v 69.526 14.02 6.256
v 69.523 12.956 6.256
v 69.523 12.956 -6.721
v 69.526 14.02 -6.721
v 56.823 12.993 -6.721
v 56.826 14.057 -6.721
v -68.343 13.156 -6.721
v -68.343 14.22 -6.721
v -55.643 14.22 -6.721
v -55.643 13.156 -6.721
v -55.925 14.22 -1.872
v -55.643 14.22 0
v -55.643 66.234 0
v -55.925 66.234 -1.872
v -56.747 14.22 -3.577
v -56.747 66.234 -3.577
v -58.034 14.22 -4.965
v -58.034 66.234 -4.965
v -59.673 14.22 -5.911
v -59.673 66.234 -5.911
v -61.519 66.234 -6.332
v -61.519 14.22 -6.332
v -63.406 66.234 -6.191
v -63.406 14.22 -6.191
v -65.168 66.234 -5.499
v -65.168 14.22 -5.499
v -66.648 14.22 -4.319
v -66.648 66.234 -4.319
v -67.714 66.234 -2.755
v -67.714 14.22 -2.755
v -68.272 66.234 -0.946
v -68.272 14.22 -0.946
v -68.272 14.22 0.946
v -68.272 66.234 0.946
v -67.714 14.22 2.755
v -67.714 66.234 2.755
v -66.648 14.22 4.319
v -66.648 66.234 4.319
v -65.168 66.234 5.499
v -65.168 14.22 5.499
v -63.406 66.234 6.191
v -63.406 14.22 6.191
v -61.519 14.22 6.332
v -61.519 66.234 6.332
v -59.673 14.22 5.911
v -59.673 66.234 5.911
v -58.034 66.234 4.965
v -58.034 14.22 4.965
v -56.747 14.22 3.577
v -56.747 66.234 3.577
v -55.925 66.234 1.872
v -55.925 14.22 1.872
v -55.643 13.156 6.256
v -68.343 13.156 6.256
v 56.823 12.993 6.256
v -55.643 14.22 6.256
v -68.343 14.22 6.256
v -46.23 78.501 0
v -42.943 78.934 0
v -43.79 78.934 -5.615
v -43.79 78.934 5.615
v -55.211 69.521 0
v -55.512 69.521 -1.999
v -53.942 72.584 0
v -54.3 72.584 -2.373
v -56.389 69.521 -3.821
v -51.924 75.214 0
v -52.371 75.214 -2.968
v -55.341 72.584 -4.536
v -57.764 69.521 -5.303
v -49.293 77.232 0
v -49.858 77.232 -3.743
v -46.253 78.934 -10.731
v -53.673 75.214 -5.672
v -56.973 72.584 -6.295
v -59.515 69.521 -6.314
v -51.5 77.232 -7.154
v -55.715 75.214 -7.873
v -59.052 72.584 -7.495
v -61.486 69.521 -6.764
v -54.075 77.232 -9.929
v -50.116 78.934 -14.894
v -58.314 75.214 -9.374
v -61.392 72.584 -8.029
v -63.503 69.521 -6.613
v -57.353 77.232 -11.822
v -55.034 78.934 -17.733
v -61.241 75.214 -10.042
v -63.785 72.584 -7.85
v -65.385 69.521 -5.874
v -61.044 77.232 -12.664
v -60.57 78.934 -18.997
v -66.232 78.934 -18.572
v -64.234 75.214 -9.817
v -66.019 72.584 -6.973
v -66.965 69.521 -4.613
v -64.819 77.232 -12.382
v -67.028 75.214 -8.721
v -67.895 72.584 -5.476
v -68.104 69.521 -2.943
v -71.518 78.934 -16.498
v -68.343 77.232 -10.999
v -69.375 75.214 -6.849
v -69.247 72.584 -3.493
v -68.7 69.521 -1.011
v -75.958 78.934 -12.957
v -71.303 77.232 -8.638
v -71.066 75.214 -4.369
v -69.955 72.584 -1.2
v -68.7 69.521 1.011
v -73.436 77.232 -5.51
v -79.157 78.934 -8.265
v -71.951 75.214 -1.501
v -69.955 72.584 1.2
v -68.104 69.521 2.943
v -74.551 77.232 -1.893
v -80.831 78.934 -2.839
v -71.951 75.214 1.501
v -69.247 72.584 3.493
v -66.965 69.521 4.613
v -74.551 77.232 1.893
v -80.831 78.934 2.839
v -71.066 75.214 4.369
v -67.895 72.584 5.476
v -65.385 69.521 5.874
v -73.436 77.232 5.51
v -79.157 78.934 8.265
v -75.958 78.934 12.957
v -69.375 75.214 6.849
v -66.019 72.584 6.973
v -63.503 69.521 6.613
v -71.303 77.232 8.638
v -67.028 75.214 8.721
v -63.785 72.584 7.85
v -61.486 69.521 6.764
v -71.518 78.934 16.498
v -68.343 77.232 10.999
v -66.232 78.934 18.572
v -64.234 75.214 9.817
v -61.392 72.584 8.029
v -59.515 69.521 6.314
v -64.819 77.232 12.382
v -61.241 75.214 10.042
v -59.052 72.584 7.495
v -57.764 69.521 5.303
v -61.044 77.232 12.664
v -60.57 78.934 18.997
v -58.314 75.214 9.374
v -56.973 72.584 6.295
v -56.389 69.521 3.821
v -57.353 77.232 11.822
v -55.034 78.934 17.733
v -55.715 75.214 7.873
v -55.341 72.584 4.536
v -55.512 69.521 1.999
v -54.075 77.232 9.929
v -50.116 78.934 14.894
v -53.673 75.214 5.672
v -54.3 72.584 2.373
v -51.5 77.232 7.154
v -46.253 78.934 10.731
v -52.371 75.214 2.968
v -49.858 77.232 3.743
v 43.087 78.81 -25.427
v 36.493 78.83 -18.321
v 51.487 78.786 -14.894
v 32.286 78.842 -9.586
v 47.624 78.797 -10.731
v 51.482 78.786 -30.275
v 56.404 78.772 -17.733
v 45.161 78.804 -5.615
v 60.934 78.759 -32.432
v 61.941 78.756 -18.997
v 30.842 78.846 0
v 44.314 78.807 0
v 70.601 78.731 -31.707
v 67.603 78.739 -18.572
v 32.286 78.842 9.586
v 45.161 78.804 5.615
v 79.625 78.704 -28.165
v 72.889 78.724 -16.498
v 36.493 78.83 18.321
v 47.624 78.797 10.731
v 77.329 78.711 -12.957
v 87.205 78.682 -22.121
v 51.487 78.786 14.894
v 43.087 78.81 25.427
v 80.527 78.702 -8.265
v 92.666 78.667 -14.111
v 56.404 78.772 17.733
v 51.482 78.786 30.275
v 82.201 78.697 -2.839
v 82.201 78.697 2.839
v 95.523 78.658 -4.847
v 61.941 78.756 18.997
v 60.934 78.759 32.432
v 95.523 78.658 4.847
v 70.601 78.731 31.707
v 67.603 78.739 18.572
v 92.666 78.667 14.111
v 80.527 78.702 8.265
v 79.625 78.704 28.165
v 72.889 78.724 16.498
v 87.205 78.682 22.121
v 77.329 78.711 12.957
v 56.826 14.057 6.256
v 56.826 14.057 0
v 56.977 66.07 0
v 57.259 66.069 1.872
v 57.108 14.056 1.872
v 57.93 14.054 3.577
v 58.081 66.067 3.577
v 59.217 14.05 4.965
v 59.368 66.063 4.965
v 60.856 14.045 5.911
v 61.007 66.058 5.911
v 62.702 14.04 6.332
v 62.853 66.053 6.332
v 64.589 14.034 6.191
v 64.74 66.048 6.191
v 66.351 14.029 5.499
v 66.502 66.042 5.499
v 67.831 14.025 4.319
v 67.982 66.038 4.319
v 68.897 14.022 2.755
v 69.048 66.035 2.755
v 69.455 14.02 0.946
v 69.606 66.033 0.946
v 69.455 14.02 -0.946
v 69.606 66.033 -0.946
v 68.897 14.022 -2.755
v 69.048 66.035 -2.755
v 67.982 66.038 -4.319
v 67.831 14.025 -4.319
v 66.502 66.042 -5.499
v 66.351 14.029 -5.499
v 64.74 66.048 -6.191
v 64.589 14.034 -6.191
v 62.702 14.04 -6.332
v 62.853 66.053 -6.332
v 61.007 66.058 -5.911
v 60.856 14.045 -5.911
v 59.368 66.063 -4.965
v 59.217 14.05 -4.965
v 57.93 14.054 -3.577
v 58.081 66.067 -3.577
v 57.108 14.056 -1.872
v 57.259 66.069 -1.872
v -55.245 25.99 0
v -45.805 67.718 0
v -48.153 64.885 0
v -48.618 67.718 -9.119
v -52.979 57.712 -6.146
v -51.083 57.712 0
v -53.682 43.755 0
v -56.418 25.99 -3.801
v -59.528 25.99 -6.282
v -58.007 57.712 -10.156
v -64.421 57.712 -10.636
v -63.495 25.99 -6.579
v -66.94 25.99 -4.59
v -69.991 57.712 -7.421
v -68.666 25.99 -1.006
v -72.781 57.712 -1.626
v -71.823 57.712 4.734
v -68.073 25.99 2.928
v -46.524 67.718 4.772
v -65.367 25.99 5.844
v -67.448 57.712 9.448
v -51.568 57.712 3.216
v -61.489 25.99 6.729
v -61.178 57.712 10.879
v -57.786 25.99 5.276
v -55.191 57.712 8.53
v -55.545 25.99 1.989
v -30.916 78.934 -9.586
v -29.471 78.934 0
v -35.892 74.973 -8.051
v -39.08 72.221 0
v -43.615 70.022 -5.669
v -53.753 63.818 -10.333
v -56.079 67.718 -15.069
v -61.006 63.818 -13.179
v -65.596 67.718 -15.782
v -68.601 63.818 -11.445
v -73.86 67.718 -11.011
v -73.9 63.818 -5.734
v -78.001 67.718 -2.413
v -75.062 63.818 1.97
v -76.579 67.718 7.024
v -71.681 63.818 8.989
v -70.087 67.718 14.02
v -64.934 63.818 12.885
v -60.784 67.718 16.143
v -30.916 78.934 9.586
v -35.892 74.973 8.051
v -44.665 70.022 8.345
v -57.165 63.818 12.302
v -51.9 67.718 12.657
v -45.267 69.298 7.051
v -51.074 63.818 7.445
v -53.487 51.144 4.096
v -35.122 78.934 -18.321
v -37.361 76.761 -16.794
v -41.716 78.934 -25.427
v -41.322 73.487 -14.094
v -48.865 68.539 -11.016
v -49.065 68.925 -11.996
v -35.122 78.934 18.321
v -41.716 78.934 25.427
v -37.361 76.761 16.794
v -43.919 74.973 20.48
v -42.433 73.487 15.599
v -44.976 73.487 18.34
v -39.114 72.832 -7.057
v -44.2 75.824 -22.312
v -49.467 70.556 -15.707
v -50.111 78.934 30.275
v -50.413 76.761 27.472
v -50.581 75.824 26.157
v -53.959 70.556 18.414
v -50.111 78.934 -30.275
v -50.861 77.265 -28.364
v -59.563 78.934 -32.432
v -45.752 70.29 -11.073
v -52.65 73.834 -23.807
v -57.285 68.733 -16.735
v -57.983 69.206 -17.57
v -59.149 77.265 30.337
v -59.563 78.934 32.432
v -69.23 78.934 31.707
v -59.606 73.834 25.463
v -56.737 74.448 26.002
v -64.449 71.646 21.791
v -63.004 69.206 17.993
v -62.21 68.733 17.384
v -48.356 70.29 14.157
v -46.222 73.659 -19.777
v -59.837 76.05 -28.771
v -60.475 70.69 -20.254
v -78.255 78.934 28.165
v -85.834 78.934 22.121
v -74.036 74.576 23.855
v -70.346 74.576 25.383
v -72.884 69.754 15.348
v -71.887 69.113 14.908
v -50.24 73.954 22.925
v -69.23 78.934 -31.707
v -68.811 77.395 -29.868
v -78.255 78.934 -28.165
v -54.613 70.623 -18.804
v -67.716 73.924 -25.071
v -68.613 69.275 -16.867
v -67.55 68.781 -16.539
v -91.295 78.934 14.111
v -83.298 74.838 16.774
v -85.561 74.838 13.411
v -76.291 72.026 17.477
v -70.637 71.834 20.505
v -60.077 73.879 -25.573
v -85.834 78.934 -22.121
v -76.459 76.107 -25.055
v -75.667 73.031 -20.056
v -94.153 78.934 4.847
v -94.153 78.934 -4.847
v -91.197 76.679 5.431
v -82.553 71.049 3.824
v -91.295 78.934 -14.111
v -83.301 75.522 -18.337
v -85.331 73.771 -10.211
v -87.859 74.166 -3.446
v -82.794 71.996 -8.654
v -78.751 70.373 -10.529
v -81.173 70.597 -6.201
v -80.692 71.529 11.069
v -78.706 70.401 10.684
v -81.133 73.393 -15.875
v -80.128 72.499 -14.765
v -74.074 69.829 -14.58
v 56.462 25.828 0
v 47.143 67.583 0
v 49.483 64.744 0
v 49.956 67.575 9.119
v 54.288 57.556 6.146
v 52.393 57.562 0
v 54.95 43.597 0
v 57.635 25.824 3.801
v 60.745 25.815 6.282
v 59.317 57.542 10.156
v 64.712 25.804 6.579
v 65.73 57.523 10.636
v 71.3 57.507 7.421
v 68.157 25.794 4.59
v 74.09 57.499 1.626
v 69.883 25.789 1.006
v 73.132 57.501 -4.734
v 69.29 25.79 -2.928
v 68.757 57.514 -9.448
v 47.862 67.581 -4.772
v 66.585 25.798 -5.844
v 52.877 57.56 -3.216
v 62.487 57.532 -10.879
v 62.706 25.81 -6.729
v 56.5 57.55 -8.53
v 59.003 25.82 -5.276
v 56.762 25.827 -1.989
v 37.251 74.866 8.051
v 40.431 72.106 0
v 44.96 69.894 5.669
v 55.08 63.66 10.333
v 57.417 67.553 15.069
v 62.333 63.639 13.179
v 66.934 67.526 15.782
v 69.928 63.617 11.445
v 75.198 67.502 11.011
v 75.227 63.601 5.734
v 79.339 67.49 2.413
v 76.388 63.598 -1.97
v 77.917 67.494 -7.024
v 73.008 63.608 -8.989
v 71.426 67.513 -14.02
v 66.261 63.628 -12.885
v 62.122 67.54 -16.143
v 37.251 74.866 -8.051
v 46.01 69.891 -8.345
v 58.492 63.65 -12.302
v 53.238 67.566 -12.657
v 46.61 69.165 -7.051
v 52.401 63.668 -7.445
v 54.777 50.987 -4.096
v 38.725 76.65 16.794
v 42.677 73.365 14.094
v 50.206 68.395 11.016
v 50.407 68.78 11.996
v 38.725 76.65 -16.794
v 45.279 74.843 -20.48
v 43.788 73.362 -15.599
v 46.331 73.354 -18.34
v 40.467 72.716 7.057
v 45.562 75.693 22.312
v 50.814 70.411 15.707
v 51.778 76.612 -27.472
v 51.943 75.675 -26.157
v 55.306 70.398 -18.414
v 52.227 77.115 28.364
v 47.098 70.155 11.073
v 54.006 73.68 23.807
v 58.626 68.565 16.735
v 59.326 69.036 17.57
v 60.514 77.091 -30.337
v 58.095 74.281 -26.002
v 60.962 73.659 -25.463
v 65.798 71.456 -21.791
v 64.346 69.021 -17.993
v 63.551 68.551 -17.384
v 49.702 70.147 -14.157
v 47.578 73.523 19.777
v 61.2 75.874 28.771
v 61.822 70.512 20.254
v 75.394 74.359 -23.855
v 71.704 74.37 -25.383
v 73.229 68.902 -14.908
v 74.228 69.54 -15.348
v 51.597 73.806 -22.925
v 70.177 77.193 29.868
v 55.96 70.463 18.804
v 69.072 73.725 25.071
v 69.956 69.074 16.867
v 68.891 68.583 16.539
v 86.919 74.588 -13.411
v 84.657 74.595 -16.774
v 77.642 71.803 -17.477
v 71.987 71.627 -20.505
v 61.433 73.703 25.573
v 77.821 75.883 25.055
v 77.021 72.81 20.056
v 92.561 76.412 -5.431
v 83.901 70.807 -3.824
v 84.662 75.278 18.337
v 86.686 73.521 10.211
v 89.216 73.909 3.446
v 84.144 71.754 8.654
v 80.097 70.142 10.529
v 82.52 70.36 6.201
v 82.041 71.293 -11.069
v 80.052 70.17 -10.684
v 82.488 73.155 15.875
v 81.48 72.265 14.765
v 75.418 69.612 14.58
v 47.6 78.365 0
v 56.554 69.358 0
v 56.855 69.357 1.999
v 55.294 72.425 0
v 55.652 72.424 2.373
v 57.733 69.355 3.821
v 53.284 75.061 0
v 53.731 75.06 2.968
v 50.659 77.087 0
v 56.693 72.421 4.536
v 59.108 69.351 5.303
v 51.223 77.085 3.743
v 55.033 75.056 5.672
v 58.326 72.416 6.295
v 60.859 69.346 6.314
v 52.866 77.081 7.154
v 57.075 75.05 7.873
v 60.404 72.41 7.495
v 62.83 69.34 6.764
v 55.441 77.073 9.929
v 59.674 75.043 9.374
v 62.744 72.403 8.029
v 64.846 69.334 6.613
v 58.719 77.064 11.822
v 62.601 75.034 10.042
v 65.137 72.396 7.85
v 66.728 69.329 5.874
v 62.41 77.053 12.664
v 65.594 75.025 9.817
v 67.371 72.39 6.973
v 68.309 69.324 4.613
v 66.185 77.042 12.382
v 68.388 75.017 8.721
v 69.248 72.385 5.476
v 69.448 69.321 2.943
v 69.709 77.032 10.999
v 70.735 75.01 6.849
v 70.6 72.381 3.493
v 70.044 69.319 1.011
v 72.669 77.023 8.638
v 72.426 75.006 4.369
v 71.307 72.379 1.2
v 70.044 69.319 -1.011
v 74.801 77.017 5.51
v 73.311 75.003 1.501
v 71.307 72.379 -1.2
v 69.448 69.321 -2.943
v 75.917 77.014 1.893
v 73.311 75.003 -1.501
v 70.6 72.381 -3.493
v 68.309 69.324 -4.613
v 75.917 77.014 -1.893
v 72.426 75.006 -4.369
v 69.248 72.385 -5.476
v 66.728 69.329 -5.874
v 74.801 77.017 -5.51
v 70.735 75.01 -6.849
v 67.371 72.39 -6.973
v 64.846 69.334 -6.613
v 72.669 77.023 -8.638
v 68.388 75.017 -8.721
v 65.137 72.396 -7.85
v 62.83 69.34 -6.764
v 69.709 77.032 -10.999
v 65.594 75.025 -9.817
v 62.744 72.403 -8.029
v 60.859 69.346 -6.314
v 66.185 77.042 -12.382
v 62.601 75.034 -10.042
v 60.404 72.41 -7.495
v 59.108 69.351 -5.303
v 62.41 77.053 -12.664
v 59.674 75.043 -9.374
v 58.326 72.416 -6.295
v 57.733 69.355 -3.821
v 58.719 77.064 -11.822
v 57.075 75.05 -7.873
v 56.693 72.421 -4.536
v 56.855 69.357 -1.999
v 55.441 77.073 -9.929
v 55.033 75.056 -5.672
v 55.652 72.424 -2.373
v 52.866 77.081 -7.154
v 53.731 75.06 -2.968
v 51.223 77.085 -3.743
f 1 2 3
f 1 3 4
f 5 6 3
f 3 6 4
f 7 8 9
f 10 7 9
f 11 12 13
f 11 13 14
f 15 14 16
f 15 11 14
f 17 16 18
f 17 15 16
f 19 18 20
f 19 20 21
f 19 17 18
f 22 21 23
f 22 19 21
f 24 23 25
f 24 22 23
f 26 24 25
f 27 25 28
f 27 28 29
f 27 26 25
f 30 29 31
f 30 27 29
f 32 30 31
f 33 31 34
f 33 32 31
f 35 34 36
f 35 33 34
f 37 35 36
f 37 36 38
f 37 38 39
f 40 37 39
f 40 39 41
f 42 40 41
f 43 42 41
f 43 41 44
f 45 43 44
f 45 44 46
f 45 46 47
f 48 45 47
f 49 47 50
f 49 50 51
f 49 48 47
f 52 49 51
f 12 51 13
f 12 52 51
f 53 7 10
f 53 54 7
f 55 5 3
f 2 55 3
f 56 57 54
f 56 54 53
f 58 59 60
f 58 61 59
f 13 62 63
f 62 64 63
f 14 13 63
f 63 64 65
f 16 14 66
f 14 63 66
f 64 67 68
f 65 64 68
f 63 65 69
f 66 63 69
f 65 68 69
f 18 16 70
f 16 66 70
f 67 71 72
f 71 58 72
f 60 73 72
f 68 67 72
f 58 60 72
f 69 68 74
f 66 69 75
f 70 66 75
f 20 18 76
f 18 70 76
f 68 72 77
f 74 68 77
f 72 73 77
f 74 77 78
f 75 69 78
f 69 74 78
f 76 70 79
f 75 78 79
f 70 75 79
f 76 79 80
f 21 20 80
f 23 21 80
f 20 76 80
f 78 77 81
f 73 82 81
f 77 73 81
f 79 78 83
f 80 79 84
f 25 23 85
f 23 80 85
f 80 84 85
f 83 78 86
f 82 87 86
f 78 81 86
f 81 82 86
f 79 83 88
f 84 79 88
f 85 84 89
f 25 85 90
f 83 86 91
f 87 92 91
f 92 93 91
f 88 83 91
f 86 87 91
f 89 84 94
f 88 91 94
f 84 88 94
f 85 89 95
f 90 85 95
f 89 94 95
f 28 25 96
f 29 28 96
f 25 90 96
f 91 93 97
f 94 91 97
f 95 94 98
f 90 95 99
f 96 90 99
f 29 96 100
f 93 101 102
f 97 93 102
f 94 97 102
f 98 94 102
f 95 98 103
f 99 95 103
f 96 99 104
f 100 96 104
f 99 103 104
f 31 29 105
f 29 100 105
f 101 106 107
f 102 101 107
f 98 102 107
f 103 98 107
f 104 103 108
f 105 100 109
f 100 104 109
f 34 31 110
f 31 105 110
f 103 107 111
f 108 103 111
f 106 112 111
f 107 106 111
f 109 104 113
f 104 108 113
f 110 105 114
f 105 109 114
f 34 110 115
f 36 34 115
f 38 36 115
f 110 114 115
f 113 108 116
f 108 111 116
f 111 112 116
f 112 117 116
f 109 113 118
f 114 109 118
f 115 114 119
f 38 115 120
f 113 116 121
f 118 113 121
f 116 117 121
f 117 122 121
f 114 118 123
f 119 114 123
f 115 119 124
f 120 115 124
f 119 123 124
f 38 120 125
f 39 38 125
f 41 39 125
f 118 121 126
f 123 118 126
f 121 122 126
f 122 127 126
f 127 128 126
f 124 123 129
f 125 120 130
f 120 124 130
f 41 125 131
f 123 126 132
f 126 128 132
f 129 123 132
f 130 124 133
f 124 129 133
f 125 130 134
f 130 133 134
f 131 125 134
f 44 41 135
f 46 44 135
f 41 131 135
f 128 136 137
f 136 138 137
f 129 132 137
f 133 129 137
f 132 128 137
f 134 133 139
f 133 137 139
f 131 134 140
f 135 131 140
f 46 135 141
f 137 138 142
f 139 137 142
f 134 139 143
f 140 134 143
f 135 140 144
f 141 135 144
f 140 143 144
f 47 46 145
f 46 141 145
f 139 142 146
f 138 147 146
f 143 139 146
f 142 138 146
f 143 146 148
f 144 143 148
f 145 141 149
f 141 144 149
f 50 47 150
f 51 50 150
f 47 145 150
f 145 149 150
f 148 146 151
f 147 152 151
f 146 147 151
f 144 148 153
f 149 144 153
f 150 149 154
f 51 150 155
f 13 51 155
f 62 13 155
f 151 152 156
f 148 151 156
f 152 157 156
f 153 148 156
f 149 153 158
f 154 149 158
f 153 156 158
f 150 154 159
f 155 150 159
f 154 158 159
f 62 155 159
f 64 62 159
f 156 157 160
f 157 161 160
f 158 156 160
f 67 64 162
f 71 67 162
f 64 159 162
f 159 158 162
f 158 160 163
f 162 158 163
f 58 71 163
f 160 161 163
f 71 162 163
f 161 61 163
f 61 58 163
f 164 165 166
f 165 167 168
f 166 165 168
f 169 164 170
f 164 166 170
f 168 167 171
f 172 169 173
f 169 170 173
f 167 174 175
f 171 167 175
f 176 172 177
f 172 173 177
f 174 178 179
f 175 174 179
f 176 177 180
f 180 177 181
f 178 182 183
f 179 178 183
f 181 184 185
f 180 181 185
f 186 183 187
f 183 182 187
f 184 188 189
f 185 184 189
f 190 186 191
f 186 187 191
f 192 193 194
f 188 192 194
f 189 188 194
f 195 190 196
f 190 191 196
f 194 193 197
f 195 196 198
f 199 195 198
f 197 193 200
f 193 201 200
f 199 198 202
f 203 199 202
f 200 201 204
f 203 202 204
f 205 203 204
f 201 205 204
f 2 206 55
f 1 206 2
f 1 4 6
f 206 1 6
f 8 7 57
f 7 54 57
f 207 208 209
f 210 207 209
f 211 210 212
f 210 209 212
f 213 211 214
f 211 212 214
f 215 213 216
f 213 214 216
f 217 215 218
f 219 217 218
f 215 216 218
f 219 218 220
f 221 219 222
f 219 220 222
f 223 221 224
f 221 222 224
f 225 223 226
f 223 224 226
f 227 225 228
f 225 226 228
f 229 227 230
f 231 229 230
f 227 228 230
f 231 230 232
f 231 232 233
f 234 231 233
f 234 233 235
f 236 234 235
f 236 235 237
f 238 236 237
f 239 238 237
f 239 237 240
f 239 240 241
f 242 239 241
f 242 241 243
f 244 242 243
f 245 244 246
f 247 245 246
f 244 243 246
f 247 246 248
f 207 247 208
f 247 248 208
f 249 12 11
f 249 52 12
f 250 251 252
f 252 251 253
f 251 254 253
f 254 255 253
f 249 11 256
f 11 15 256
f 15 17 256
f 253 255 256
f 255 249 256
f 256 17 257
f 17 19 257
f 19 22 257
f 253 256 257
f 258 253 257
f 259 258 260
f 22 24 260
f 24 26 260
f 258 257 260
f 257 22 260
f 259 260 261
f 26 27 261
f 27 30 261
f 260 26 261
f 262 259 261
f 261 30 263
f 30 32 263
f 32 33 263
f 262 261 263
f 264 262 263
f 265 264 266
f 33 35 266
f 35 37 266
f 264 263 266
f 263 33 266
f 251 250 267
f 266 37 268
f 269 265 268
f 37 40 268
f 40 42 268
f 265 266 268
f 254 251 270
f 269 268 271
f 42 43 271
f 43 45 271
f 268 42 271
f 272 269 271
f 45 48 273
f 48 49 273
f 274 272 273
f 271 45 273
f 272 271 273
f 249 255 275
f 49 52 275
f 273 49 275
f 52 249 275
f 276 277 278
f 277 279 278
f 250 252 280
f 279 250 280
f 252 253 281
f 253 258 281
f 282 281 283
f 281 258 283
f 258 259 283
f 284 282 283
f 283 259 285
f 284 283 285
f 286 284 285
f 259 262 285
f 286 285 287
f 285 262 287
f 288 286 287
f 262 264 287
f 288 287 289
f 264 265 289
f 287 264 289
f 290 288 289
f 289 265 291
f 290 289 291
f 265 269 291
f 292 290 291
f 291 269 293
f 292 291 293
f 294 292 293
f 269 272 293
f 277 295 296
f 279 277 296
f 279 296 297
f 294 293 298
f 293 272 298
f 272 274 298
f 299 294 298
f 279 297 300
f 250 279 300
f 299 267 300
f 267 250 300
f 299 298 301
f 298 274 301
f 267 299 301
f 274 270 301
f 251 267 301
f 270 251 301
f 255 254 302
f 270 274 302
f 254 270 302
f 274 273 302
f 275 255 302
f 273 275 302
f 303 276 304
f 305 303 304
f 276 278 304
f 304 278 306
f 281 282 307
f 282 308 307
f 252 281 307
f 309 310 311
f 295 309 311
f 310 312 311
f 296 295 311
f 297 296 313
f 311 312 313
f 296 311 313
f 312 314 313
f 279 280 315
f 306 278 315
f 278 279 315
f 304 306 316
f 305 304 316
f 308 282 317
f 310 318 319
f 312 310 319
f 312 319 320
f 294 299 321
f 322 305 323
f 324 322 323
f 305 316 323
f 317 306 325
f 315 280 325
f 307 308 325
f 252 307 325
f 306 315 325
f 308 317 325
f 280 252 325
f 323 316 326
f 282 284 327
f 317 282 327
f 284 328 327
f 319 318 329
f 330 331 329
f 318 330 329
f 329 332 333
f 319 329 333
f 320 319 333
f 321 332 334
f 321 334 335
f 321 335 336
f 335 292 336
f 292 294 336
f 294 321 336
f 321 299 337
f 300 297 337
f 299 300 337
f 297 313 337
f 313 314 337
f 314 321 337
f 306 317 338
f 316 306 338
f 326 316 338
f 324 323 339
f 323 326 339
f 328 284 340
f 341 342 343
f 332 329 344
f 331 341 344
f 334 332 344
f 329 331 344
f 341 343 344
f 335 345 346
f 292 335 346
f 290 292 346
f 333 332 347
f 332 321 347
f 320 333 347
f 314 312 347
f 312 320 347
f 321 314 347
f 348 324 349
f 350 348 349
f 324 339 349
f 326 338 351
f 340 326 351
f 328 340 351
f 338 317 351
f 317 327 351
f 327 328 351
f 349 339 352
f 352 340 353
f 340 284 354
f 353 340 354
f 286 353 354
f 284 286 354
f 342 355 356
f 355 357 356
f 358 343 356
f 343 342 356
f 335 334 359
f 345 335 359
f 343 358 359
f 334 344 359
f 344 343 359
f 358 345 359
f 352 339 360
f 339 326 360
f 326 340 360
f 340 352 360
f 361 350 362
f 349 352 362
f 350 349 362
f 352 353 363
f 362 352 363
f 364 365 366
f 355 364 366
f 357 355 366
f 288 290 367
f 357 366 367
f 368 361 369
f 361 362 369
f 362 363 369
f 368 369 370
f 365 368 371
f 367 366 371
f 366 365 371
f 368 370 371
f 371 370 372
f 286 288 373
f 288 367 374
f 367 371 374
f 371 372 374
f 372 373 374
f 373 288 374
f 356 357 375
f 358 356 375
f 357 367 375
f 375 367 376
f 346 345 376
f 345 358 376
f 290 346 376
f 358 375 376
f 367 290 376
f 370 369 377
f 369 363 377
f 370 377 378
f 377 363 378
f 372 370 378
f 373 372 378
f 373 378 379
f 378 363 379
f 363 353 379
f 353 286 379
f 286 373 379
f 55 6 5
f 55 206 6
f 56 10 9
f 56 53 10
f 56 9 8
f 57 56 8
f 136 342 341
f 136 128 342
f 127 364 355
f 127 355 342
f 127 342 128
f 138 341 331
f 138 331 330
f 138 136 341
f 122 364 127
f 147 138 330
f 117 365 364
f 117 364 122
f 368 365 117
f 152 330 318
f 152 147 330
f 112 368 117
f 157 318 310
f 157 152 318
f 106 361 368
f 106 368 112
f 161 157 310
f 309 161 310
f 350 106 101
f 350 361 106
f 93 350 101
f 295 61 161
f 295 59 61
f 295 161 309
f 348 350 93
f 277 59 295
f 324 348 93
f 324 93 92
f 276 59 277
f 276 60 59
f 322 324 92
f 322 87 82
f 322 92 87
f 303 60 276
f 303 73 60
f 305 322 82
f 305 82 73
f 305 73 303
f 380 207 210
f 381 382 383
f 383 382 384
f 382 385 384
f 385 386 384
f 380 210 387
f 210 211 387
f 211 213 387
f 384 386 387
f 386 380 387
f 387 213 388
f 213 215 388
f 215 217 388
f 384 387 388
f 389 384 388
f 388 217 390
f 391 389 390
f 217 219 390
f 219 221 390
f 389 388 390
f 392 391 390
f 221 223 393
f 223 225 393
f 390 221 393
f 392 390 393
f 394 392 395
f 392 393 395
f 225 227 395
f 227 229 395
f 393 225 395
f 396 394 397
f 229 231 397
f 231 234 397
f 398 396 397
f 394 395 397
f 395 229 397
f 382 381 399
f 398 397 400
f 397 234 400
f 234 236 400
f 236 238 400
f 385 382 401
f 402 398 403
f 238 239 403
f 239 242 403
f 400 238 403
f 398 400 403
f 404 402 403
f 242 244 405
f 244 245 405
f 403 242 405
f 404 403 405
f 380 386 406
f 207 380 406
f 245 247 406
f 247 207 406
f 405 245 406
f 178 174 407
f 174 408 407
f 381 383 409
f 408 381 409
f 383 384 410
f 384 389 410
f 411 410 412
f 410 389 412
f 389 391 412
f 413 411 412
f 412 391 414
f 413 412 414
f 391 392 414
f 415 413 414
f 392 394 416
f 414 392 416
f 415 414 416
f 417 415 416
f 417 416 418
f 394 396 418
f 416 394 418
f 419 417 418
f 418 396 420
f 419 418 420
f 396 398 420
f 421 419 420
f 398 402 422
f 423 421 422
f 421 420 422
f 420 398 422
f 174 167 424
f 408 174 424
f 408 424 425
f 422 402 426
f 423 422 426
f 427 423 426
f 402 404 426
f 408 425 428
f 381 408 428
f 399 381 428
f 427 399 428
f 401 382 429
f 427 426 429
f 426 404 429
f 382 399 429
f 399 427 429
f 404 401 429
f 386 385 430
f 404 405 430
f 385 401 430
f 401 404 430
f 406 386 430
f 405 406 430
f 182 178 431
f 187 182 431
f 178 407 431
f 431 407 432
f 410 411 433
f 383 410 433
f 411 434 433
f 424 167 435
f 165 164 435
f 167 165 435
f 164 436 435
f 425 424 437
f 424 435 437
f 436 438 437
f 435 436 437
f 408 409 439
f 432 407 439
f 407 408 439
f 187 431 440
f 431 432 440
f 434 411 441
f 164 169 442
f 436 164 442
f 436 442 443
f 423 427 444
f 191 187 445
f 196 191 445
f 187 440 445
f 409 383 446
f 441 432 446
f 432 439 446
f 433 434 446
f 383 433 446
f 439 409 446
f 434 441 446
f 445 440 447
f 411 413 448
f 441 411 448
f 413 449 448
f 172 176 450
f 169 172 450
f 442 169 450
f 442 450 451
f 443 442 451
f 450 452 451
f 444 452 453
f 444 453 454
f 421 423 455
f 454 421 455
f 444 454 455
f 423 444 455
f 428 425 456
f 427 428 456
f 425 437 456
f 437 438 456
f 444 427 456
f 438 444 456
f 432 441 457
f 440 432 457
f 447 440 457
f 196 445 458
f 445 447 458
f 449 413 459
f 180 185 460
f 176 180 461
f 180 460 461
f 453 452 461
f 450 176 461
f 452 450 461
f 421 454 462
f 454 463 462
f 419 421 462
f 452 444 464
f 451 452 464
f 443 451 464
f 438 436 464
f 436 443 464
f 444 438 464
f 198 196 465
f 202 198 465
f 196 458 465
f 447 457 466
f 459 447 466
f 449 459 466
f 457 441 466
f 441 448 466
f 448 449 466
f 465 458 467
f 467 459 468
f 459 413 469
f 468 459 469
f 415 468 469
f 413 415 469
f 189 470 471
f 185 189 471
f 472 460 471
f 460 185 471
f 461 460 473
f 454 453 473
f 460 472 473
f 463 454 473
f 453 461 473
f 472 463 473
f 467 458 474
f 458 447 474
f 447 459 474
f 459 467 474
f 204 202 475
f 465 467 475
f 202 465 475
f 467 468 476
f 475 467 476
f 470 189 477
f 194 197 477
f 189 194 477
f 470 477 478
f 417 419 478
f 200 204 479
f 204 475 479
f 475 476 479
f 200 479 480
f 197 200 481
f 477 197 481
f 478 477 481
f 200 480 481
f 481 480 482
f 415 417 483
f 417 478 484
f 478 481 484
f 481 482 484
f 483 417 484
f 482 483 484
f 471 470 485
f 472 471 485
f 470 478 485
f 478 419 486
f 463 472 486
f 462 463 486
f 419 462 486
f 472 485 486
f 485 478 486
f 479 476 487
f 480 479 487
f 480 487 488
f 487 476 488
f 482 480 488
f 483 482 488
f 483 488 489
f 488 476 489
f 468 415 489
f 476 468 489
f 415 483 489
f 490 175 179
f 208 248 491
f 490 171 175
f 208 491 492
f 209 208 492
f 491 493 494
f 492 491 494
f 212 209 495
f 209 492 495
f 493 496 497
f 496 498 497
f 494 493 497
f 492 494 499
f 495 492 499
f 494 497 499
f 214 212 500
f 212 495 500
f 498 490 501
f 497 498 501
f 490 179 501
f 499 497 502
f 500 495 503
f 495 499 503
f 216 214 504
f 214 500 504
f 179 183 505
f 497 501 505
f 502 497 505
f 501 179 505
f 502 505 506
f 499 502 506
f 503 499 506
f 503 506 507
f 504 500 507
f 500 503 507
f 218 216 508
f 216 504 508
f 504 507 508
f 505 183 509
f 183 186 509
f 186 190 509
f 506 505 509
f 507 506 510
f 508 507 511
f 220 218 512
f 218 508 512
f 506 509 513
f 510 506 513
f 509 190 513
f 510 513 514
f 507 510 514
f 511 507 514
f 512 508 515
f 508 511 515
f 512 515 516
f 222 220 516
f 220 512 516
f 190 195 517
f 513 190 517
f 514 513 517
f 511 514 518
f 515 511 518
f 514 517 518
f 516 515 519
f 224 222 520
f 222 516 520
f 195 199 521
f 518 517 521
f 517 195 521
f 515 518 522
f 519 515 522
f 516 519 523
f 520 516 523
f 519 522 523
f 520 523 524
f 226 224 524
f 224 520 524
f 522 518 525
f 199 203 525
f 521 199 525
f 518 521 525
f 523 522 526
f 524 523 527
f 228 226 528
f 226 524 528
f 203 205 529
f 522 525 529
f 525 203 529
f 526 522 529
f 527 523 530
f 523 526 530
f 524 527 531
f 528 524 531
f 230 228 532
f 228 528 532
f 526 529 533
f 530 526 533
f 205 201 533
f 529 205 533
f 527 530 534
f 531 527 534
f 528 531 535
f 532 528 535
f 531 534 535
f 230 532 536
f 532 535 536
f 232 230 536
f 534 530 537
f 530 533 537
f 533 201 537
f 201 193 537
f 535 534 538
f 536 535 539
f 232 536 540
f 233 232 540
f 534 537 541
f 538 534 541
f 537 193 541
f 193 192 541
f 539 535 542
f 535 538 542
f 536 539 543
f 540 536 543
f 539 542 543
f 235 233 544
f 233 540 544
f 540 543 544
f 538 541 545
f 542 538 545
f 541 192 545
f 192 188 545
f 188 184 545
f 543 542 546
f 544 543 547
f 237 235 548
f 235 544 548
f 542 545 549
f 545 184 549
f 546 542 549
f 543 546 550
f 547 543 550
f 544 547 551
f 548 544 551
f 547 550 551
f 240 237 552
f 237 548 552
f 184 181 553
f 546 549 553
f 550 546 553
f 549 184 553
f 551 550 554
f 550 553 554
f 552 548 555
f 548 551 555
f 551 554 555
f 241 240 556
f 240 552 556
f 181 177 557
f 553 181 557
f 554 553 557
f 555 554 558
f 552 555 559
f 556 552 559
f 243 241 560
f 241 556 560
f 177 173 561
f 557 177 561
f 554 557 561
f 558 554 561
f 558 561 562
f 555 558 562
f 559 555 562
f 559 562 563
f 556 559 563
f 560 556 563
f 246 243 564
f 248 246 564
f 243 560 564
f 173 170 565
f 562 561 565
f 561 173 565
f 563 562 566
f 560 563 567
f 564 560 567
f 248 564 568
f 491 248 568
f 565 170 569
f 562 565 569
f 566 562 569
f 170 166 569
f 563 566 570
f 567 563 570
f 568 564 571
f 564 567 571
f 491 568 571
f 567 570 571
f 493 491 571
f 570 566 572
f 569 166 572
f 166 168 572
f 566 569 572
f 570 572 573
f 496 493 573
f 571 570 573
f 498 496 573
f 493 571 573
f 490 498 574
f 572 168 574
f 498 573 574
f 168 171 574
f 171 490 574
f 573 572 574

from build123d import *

# Parameters (mm, degrees)
F0_W          = 6.35
F0_H          = 1.0640472173
F3_DEPTH      = 6.25564
F3_DEPTH_BACK = 6.72088
F5_R          = 12.7
F5_2_R        = 12.7


# Not quite as in the source:
# - a feature of the source that left no trace in its solid (it failed there, or was rolled back) is left out


with BuildPart() as f1:
    # F0 (on Top) → F1 (revolve)
    with BuildSketch(Plane.XY):
        with BuildLine():
            add(Edge.make_bspline(
                [(-29.4706169434, 78.933593278), (-40.0197984199, 69.9824278464), (-53.8529486844, 71.986483099), (-55.6433195412, 20.8469636522), (-55.6433195412, 14.2199778929)],
                knots=[0, 0, 0, 0, 0.4242982639, 1, 1, 1, 1], degree=3))
            Line((-29.4706169434, 78.933593278), (-55.6433195412, 78.933593278))
            Line((-55.6433195412, 78.933593278), (-55.6433195412, 14.2199778929))
        make_face()
    revolve(axis=Axis((-61.9933195412, 46.5767855855, 0), (0, 1, 0)))

    # F5#2
    f5_2_edges = [f1.edges().sort_by_distance(p)[0] for p in [
        (-68.34332, 78.933593, 0),
    ]]
    fillet(f5_2_edges, radius=F5_2_R)


with BuildPart() as f3:
    # F0 (on Top) → F3 (new body, two sides)
    with BuildSketch(Plane.XY) as f3_sk:
        with Locations((-58.8183195412, 13.6879542842)):
            Rectangle(F0_W, F0_H)
        with Locations((-65.1683195412, 13.6879542842)):
            Rectangle(F0_W, F0_H)
    extrude(amount=F3_DEPTH)
    extrude(f3_sk.sketch, amount=-F3_DEPTH_BACK)


with BuildPart() as f3b:
    # F0 (on Top) → F3, piece 2 (new body, two sides)
    with BuildSketch(Plane.XY) as f3_2_sk:
        Polygon((63.1731412094, 12.9742378882), (63.1762303644, 14.0382806213), (56.8262571254, 14.0567160194), (56.8231679704, 12.9926732863), align=None)
        Polygon((69.5262036034, 14.0198452232), (63.1762303644, 14.0382806213), (63.1731412094, 12.9742378882), (69.5231144484, 12.9558024901), align=None)
    extrude(amount=F3_DEPTH)
    extrude(f3_2_sk.sketch, amount=-F3_DEPTH_BACK)


with BuildPart() as f4:
    # F0 (on Top) → F4 (revolve)
    with BuildSketch(Plane.XY):
        with BuildLine():
            add(Edge.make_bspline(
                [(30.8415421924, 78.8460435923), (41.3646920775, 69.8642893703), (55.2036022425, 71.8281756051), (56.845496672, 20.6836738504), (56.8262571254, 14.0567160194)],
                knots=[0, 0, 0, 0, 0.4242982639, 1, 1, 1, 1], degree=3))
            Line((56.8262571254, 14.0567160194), (57.0141344898, 78.77005868))
            Line((57.0141344898, 78.77005868), (30.8415421924, 78.8460435923))
        make_face()
    revolve(axis=Axis((63.2701690466, 46.3949519516, 0), (0.0029032123, 0.9999957857, 0)))

    # F5
    f5_edges = [f4.edges().sort_by_distance(p)[0] for p in [
        (69.714081, 78.733188, 0),
    ]]
    fillet(f5_edges, radius=F5_R)


solid = Compound([f1.part, f3.part, f3b.part, f4.part])
